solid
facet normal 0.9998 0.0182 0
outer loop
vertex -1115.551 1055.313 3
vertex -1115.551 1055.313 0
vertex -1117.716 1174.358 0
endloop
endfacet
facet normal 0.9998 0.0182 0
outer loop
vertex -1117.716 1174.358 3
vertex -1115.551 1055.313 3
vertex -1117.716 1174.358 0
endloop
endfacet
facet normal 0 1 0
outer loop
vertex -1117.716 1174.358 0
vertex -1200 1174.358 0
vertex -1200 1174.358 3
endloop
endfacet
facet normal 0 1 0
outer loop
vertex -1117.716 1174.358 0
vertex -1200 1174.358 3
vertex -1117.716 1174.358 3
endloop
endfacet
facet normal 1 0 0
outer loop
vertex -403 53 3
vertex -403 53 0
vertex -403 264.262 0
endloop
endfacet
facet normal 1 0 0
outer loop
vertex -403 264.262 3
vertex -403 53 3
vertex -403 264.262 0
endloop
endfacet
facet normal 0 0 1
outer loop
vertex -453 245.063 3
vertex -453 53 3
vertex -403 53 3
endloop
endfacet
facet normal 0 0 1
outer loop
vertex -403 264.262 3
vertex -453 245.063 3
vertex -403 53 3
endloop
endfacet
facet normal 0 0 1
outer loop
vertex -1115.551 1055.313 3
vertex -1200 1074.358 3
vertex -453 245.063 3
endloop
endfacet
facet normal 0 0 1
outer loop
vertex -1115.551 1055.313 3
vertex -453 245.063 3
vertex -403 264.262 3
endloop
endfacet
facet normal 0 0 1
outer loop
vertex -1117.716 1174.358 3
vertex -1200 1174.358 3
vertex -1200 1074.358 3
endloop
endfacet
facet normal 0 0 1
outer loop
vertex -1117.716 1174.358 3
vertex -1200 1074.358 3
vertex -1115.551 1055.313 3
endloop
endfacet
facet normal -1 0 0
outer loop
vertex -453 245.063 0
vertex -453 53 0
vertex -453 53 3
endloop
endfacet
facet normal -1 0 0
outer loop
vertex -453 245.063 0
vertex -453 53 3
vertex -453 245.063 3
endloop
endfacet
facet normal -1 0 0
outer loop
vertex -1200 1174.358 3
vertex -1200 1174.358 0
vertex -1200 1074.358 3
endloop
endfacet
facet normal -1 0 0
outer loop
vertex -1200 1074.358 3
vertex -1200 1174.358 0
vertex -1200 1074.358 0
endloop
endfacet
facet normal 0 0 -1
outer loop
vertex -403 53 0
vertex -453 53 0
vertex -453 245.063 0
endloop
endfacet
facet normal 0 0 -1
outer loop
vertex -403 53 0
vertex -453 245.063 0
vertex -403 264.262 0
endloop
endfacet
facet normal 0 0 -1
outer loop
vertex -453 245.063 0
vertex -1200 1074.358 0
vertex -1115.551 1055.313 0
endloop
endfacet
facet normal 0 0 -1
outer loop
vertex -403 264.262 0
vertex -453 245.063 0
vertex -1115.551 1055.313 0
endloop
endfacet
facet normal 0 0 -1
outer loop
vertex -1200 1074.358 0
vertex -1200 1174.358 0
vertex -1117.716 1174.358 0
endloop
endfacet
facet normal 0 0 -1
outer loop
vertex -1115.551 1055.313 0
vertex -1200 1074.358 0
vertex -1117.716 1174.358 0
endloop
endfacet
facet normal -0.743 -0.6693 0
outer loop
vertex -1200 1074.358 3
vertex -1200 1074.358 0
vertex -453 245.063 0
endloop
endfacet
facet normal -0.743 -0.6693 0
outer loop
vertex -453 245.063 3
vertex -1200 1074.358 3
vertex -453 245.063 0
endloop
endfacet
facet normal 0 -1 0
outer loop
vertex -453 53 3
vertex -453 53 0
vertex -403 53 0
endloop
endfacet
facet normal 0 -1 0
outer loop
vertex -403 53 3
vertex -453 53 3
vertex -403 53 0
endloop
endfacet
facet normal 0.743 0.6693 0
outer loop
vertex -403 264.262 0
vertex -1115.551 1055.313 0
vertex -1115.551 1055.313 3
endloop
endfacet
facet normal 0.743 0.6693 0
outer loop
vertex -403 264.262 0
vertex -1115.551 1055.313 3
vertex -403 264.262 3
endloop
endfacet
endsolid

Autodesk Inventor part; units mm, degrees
ref_plane "YZ Plane" through (0, 0, 0) normal (1, 0, 0) x (0, 1, 0)
ref_plane "XZ Plane" through (0, 0, 0) normal (0, 1, 0) x (-1, 0, 0)
ref_plane "XY Plane" through (0, 0, 0) normal (0, 0, 1) x (1, 0, 0)
sketch "Sketch1" plane through (0, 0, 0) normal (0, 0, 1) x (1, 0, 0)
  line L0 (1200, 2950) -> (-1200, 2950)
  line L1 (-1200, 2950) -> (-1200, 0)
  line L2 (-1200, 0) -> (1200, 0)
  line L3 (1200, 0) -> (1200, 2950)
  line L4 (1150, 2950) -> (1150, 0)
  line L5 (-1150, 0) -> (-1150, 2950) construction
  line L6 (0, 2950) -> (0, 50) construction
  line L7 (-1100, 200) -> (-950, 50)
  line L8 (-1200, 100) -> (-1100, 100)
  line L9 (-1100, 100) -> (-1100, 0)
  line L10 (-1100, 200) -> (-1150, 2950)
  arc A0 (-1100.4545, 224.9959) -> (-1082.3223, 182.3223) centre (-1100, 200) ccw
  arc A1 (-1082.3223, 182.3223) -> (-1100.4545, 224.9959) centre (-1100, 200) ccw construction
  line L11 (-1200, 255) -> (-1101, 255) construction
  line L12 (0, 50) -> (-950, 50)
  line L13 (0, 50) -> (0, 0)
  line L14 (1505.3449, -225.894) -> (355.3449, -225.894)
  line L15 (-1200, 245) -> (-1100.8182, 245)
  line L16 (-1200, 2900) -> (-1149.0909, 2900)
  line L17 (-1115.5511, 1055.3131) -> (-403, 264.2623)
  line L18 (-1200, 1174.3582) -> (-1117.7156, 1174.3582)
  line L19 (-403, 0) -> (-403, 264.2623)
  line L20 (-453, 0) -> (-453, 319.7706)
  line L21 (-1200, 1074.3582) -> (-403, 189.555)
  line L22 (-453, 53) -> (-403, 53)
  line L23 (-1200, 245) -> (-101.8902, 245) construction
  point P0 (-453, 245.0633)
  point P1 (-453, 50)
  point P2 (-403, 50)
  dimension "d3" = 2400
  dimension "d4" = 2950
  dimension "d5" = 50
  dimension "d6" = 100
  dimension "d7" = 50
  dimension "d9" = 135
  dimension "d10" = 950
  dimension "d11" = 1150
  dimension "d12" = 136.042
  dimension "d13" = 50
  dimension "d14" = 100
  dimension "d15" = 212.132
  dimension "d17" = 55
  dimension "d20" = 200
  dimension "d50" = 2705
  dimension "d53" = 50
  dimension "d55" = 1895
  dimension "d57" = 100
  dimension "d59" = 403
  dimension "d60" = 50
  dimension "d62" = 50
  dimension "d63" = 3
  dimension "d65" = 264.2623
extrude "Plate1" add sketch "Sketch1" along normal blind 3 contours L10 L21 L1 L18 | L17 L20 L21 L10 | L17 L19 L21 L20 | L22 L20 L21 L19
equation "\"d11\" = d10 + d18"
equation "\"d14\" = d6"
equation "\"d2\" = Thickness"
equation "\"BendReliefWidth\" = Thickness"
equation "\"BendReliefDepth\" = 0.5 * Thickness"
equation "\"CornerReliefSize\" = 4 * Thickness"
equation "\"MinimumRemnant\" = 2 * Thickness"
equation "\"TransitionRadius\" = BendRadius"
equation "\"JacobiRadiusSize\" = BendRadius"
equation "\"GapSize\" = Thickness"
equation "\"d18\" = d19"
equation "\"Thickness\" = 3"
equation "\"BendRadius\" = 5"
equation "\"d19\" = 200"
properties part number "BSH 025 rib board cone" material "09g2s"
